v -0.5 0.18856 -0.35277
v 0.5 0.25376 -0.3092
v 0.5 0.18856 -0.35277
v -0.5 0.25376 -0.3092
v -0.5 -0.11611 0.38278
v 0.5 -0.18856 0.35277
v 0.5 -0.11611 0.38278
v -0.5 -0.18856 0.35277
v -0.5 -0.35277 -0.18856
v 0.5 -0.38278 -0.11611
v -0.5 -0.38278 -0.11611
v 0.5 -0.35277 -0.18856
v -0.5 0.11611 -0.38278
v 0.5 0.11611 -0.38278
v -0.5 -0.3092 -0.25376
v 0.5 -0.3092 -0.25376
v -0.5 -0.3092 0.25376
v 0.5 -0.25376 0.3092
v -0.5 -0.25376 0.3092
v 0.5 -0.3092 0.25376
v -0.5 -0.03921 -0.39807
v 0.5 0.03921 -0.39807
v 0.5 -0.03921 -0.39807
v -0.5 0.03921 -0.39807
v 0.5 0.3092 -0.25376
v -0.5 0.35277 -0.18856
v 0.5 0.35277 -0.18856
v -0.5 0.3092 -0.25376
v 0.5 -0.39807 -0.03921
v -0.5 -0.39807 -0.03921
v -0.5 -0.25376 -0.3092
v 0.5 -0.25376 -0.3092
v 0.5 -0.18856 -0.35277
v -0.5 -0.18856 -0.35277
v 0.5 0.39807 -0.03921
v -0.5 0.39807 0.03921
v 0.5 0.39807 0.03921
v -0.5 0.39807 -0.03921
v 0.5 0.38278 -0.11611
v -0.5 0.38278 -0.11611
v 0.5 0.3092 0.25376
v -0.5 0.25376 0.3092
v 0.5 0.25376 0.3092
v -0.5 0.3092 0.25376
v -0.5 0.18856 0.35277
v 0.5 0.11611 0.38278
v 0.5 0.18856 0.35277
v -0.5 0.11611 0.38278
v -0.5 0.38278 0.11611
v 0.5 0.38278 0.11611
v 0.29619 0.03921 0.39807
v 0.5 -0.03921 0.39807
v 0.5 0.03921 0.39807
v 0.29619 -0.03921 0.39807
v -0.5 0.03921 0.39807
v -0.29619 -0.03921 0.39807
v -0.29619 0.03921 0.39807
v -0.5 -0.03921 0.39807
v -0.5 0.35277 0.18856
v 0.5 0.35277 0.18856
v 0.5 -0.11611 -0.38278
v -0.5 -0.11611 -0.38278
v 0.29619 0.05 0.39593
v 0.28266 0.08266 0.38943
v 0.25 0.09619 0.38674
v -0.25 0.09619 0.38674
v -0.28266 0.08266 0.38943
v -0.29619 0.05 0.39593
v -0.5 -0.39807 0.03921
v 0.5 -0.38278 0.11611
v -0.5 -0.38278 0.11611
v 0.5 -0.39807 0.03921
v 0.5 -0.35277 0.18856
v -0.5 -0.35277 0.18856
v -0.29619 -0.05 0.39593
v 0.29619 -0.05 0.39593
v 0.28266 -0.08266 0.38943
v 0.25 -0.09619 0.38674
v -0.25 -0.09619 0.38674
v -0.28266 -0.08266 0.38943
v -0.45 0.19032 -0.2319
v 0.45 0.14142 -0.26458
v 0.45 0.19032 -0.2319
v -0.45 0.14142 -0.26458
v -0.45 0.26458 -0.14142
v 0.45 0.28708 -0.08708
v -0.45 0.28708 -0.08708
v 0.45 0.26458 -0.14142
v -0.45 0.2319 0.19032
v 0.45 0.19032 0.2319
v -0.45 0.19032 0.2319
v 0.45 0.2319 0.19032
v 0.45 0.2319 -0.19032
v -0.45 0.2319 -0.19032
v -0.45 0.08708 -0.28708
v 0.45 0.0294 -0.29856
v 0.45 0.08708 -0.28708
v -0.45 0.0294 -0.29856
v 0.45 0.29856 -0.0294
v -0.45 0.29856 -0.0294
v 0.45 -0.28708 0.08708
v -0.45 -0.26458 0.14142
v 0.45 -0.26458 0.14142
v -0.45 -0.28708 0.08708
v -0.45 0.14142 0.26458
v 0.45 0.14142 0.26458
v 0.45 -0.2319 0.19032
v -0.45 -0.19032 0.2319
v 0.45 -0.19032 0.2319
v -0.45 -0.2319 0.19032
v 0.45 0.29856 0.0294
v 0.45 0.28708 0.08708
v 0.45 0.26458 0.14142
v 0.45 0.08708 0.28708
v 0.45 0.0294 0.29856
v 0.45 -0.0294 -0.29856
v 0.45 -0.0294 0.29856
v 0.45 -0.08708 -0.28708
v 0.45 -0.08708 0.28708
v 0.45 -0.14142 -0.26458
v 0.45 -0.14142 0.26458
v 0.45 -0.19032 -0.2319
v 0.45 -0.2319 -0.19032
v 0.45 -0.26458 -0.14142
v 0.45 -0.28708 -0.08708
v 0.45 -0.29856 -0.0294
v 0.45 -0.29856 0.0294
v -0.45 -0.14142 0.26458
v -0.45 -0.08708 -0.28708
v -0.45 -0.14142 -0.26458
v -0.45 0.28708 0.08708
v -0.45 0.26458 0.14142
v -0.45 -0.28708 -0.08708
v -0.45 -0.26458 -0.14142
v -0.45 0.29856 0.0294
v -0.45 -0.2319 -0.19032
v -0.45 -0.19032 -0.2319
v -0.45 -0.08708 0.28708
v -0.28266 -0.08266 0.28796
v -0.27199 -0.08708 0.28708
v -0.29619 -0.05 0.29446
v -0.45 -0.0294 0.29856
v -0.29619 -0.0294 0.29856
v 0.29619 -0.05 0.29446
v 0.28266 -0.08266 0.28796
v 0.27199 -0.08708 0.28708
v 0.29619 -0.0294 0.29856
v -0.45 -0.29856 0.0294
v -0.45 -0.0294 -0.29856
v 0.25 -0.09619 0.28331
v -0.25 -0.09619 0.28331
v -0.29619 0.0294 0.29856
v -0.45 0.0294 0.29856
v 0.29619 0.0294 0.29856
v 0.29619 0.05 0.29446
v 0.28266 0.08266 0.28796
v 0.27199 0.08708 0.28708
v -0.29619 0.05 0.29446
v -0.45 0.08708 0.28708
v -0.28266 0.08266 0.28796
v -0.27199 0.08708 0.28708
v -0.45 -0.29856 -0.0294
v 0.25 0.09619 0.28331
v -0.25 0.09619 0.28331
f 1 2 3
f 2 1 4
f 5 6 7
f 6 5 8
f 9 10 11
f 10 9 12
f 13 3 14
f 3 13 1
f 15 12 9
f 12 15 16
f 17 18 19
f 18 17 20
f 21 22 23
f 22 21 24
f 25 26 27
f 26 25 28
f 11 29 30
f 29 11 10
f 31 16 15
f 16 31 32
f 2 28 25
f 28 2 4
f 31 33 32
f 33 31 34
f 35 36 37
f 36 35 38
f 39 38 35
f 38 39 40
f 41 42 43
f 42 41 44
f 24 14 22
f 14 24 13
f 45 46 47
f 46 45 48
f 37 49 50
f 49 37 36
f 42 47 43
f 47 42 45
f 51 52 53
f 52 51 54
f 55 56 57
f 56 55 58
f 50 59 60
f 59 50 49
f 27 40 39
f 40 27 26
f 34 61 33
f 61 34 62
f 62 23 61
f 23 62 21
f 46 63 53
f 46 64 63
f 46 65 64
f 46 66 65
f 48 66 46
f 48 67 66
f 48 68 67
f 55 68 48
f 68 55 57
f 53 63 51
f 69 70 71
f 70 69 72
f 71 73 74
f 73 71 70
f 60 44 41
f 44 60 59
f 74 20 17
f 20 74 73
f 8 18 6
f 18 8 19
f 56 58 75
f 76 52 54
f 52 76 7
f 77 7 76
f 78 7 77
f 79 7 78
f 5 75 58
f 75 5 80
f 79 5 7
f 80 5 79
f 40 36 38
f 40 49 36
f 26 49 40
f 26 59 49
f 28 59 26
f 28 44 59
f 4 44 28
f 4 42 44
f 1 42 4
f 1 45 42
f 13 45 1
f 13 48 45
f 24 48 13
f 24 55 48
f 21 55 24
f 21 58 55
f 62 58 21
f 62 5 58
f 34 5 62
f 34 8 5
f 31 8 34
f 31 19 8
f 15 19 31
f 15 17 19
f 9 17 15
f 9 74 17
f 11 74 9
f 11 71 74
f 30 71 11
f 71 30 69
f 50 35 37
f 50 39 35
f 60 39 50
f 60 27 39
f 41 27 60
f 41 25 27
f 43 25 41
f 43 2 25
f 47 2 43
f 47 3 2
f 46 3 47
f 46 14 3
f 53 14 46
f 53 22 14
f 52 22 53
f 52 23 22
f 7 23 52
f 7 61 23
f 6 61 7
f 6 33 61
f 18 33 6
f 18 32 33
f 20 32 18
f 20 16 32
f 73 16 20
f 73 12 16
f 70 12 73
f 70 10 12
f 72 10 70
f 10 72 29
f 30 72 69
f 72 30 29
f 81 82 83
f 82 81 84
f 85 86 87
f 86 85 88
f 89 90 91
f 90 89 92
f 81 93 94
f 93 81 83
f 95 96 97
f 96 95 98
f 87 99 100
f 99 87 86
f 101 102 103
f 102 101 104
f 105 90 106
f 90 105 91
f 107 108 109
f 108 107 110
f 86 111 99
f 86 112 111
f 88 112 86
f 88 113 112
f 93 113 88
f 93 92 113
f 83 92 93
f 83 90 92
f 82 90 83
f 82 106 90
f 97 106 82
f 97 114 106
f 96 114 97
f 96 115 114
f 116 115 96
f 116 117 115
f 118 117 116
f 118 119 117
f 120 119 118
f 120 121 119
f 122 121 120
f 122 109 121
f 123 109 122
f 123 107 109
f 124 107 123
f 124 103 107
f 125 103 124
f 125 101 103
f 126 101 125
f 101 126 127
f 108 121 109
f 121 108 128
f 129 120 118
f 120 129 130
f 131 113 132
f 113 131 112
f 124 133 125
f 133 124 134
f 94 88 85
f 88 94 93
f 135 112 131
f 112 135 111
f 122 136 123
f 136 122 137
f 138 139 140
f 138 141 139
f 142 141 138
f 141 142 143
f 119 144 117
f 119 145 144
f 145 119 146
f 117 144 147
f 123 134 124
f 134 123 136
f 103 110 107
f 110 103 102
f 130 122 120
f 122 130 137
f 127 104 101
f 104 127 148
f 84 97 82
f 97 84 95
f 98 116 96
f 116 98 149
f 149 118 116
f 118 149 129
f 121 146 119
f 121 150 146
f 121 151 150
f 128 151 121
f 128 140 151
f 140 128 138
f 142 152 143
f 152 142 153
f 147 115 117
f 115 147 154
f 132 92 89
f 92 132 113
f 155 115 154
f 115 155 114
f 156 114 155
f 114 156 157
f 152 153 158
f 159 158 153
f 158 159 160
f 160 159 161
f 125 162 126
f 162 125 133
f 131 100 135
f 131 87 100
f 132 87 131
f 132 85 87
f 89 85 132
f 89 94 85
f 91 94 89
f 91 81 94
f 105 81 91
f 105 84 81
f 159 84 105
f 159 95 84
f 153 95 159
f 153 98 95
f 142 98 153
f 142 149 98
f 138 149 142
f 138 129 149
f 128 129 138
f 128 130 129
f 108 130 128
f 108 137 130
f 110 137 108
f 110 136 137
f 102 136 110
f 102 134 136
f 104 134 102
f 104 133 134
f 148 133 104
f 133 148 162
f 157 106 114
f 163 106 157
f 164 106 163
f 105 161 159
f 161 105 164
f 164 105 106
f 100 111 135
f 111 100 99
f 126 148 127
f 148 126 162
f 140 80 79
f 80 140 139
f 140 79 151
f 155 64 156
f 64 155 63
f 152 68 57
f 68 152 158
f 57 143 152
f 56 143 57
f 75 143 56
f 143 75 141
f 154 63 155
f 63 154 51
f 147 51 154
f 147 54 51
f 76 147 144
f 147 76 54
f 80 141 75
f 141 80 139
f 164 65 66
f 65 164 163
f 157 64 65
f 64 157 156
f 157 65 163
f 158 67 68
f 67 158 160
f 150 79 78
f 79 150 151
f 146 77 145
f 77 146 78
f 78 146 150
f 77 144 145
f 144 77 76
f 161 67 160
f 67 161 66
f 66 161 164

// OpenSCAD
use <lib.scad>

hd=32;
ld=16;
vld=6;

module straight() {
	rotate([180/$fn,0,0]) rotate([0,90,0]) cyl(0.4, 0.4, 1.0);
}

module window() {
	difference() {
		rotate([180/$fn,0,0]) rotate([0,90,0]) cyl(0.4, 0.4, 1.0);
		rotate([180/$fn,0,0]) rotate([0,90,0]) cyl(0.3, 0.3, 0.9);
		translate([0,0,0.25]) rbox([0.6,0.2,0.5],0.05,$fn=$fn/4);
	}
}

module windowFluid() {
	rotate([180/$fn,0,0]) rotate([0,90,0]) cyl(0.3, 0.3, 0.9);
}

module cross() {
	union() {
		rotate([180/$fn,0,0]) rotate([0,90,0]) cyl(0.4, 0.4, 1.0);
		rotate([0,180/$fn,0]) rotate([90,0,0]) cyl(0.4, 0.4, 1.0);
	}
}

module flange() {
	if ($fn >= ld) difference() {
		cyl(0.475, 0.475, 0.1);
		if ($fn > ld) {
			for (i = [0:45:360])
				#rotate([0,0,i]) translate([0.425,0,0]) cyl(0.025, 0.025, 0.11, $fn=$fn/4);
		}
	}
}

module ground() {
	union() {
		translate([-0.45,0,-0.45]) rotate([90,0,0]) intersection() {
			rotate_extrude(convexity=10) translate([0.45,0,0]) circle(r=0.4);
			translate([0.5,0.5,0]) box([1,1,1]);
		}
		translate([-0.45,0,0]) rotate([0,90,0]) flange();
		translate([0,0,-0.45]) flange();
	}
}

module tee() {
	union() {
		translate([0.25,0,0]) rotate([180/$fn,0,0]) rotate([0,90,0]) cyl(0.4, 0.4, 0.5);
		translate([0,0.25,0]) rotate([0,180/$fn,0]) rotate([90,0,0]) cyl(0.4, 0.4, 0.5);
		translate([0,-0.25,0]) rotate([0,180/$fn,0]) rotate([90,0,0]) cyl(0.4, 0.4, 0.5);
	}
}

module item() {
	rotate([0,90,0]) difference() {
		union() {
			rotate([180/$fn,0,0]) rotate([0,90,0]) cyl(0.375, 0.375, 0.9);
			translate([0.4,0,0]) rotate([0,90,0]) flange();
			translate([-0.4,0,0]) rotate([0,90,0]) flange();
		}
		rotate([180/$fn,0,0]) rotate([0,90,0]) cyl(0.3, 0.3, 1.1);
	}
}

module valve() {
	union() {
		straight();
		translate([0,0,0.45]) union() {
			torus(0.05,0.3,$fn=$fn/2);
			rotate([0,90,0]) cyl(0.04,0.04,0.7,$fn=$fn/4);
			rotate([0,0,90]) rotate([0,90,0]) cyl(0.04,0.04,0.7,$fn=$fn/4);
		}
		translate([0,0,0.25]) cyl(0.1,0.1,0.5);
	}
}

module chevron() {
	rotate([90,0,0]) cyl(0.3,0.3,0.85, $fn=3);
}

module elbow() {
	rotate([0,-90,0]) rotate([0,0,-90]) ground();
}

//straight($fn=hd);
//straight($fn=ld);
//straight($fn=vld);
//cross($fn=hd);
//cross($fn=ld);
//cross($fn=vld);
//elbow($fn=hd);
//elbow($fn=ld);
//elbow($fn=vld);
//tee($fn=hd);
//tee($fn=ld);
//tee($fn=vld);
//ground($fn=hd);
//ground($fn=ld);
//ground($fn=vld);
//item($fn=hd);
//item($fn=ld);
//valve($fn=hd);
//valve($fn=ld);
//chevron($fn=ld);
//window($fn=hd*2);
window($fn=ld*2);
//windowFluid($fn=6);
